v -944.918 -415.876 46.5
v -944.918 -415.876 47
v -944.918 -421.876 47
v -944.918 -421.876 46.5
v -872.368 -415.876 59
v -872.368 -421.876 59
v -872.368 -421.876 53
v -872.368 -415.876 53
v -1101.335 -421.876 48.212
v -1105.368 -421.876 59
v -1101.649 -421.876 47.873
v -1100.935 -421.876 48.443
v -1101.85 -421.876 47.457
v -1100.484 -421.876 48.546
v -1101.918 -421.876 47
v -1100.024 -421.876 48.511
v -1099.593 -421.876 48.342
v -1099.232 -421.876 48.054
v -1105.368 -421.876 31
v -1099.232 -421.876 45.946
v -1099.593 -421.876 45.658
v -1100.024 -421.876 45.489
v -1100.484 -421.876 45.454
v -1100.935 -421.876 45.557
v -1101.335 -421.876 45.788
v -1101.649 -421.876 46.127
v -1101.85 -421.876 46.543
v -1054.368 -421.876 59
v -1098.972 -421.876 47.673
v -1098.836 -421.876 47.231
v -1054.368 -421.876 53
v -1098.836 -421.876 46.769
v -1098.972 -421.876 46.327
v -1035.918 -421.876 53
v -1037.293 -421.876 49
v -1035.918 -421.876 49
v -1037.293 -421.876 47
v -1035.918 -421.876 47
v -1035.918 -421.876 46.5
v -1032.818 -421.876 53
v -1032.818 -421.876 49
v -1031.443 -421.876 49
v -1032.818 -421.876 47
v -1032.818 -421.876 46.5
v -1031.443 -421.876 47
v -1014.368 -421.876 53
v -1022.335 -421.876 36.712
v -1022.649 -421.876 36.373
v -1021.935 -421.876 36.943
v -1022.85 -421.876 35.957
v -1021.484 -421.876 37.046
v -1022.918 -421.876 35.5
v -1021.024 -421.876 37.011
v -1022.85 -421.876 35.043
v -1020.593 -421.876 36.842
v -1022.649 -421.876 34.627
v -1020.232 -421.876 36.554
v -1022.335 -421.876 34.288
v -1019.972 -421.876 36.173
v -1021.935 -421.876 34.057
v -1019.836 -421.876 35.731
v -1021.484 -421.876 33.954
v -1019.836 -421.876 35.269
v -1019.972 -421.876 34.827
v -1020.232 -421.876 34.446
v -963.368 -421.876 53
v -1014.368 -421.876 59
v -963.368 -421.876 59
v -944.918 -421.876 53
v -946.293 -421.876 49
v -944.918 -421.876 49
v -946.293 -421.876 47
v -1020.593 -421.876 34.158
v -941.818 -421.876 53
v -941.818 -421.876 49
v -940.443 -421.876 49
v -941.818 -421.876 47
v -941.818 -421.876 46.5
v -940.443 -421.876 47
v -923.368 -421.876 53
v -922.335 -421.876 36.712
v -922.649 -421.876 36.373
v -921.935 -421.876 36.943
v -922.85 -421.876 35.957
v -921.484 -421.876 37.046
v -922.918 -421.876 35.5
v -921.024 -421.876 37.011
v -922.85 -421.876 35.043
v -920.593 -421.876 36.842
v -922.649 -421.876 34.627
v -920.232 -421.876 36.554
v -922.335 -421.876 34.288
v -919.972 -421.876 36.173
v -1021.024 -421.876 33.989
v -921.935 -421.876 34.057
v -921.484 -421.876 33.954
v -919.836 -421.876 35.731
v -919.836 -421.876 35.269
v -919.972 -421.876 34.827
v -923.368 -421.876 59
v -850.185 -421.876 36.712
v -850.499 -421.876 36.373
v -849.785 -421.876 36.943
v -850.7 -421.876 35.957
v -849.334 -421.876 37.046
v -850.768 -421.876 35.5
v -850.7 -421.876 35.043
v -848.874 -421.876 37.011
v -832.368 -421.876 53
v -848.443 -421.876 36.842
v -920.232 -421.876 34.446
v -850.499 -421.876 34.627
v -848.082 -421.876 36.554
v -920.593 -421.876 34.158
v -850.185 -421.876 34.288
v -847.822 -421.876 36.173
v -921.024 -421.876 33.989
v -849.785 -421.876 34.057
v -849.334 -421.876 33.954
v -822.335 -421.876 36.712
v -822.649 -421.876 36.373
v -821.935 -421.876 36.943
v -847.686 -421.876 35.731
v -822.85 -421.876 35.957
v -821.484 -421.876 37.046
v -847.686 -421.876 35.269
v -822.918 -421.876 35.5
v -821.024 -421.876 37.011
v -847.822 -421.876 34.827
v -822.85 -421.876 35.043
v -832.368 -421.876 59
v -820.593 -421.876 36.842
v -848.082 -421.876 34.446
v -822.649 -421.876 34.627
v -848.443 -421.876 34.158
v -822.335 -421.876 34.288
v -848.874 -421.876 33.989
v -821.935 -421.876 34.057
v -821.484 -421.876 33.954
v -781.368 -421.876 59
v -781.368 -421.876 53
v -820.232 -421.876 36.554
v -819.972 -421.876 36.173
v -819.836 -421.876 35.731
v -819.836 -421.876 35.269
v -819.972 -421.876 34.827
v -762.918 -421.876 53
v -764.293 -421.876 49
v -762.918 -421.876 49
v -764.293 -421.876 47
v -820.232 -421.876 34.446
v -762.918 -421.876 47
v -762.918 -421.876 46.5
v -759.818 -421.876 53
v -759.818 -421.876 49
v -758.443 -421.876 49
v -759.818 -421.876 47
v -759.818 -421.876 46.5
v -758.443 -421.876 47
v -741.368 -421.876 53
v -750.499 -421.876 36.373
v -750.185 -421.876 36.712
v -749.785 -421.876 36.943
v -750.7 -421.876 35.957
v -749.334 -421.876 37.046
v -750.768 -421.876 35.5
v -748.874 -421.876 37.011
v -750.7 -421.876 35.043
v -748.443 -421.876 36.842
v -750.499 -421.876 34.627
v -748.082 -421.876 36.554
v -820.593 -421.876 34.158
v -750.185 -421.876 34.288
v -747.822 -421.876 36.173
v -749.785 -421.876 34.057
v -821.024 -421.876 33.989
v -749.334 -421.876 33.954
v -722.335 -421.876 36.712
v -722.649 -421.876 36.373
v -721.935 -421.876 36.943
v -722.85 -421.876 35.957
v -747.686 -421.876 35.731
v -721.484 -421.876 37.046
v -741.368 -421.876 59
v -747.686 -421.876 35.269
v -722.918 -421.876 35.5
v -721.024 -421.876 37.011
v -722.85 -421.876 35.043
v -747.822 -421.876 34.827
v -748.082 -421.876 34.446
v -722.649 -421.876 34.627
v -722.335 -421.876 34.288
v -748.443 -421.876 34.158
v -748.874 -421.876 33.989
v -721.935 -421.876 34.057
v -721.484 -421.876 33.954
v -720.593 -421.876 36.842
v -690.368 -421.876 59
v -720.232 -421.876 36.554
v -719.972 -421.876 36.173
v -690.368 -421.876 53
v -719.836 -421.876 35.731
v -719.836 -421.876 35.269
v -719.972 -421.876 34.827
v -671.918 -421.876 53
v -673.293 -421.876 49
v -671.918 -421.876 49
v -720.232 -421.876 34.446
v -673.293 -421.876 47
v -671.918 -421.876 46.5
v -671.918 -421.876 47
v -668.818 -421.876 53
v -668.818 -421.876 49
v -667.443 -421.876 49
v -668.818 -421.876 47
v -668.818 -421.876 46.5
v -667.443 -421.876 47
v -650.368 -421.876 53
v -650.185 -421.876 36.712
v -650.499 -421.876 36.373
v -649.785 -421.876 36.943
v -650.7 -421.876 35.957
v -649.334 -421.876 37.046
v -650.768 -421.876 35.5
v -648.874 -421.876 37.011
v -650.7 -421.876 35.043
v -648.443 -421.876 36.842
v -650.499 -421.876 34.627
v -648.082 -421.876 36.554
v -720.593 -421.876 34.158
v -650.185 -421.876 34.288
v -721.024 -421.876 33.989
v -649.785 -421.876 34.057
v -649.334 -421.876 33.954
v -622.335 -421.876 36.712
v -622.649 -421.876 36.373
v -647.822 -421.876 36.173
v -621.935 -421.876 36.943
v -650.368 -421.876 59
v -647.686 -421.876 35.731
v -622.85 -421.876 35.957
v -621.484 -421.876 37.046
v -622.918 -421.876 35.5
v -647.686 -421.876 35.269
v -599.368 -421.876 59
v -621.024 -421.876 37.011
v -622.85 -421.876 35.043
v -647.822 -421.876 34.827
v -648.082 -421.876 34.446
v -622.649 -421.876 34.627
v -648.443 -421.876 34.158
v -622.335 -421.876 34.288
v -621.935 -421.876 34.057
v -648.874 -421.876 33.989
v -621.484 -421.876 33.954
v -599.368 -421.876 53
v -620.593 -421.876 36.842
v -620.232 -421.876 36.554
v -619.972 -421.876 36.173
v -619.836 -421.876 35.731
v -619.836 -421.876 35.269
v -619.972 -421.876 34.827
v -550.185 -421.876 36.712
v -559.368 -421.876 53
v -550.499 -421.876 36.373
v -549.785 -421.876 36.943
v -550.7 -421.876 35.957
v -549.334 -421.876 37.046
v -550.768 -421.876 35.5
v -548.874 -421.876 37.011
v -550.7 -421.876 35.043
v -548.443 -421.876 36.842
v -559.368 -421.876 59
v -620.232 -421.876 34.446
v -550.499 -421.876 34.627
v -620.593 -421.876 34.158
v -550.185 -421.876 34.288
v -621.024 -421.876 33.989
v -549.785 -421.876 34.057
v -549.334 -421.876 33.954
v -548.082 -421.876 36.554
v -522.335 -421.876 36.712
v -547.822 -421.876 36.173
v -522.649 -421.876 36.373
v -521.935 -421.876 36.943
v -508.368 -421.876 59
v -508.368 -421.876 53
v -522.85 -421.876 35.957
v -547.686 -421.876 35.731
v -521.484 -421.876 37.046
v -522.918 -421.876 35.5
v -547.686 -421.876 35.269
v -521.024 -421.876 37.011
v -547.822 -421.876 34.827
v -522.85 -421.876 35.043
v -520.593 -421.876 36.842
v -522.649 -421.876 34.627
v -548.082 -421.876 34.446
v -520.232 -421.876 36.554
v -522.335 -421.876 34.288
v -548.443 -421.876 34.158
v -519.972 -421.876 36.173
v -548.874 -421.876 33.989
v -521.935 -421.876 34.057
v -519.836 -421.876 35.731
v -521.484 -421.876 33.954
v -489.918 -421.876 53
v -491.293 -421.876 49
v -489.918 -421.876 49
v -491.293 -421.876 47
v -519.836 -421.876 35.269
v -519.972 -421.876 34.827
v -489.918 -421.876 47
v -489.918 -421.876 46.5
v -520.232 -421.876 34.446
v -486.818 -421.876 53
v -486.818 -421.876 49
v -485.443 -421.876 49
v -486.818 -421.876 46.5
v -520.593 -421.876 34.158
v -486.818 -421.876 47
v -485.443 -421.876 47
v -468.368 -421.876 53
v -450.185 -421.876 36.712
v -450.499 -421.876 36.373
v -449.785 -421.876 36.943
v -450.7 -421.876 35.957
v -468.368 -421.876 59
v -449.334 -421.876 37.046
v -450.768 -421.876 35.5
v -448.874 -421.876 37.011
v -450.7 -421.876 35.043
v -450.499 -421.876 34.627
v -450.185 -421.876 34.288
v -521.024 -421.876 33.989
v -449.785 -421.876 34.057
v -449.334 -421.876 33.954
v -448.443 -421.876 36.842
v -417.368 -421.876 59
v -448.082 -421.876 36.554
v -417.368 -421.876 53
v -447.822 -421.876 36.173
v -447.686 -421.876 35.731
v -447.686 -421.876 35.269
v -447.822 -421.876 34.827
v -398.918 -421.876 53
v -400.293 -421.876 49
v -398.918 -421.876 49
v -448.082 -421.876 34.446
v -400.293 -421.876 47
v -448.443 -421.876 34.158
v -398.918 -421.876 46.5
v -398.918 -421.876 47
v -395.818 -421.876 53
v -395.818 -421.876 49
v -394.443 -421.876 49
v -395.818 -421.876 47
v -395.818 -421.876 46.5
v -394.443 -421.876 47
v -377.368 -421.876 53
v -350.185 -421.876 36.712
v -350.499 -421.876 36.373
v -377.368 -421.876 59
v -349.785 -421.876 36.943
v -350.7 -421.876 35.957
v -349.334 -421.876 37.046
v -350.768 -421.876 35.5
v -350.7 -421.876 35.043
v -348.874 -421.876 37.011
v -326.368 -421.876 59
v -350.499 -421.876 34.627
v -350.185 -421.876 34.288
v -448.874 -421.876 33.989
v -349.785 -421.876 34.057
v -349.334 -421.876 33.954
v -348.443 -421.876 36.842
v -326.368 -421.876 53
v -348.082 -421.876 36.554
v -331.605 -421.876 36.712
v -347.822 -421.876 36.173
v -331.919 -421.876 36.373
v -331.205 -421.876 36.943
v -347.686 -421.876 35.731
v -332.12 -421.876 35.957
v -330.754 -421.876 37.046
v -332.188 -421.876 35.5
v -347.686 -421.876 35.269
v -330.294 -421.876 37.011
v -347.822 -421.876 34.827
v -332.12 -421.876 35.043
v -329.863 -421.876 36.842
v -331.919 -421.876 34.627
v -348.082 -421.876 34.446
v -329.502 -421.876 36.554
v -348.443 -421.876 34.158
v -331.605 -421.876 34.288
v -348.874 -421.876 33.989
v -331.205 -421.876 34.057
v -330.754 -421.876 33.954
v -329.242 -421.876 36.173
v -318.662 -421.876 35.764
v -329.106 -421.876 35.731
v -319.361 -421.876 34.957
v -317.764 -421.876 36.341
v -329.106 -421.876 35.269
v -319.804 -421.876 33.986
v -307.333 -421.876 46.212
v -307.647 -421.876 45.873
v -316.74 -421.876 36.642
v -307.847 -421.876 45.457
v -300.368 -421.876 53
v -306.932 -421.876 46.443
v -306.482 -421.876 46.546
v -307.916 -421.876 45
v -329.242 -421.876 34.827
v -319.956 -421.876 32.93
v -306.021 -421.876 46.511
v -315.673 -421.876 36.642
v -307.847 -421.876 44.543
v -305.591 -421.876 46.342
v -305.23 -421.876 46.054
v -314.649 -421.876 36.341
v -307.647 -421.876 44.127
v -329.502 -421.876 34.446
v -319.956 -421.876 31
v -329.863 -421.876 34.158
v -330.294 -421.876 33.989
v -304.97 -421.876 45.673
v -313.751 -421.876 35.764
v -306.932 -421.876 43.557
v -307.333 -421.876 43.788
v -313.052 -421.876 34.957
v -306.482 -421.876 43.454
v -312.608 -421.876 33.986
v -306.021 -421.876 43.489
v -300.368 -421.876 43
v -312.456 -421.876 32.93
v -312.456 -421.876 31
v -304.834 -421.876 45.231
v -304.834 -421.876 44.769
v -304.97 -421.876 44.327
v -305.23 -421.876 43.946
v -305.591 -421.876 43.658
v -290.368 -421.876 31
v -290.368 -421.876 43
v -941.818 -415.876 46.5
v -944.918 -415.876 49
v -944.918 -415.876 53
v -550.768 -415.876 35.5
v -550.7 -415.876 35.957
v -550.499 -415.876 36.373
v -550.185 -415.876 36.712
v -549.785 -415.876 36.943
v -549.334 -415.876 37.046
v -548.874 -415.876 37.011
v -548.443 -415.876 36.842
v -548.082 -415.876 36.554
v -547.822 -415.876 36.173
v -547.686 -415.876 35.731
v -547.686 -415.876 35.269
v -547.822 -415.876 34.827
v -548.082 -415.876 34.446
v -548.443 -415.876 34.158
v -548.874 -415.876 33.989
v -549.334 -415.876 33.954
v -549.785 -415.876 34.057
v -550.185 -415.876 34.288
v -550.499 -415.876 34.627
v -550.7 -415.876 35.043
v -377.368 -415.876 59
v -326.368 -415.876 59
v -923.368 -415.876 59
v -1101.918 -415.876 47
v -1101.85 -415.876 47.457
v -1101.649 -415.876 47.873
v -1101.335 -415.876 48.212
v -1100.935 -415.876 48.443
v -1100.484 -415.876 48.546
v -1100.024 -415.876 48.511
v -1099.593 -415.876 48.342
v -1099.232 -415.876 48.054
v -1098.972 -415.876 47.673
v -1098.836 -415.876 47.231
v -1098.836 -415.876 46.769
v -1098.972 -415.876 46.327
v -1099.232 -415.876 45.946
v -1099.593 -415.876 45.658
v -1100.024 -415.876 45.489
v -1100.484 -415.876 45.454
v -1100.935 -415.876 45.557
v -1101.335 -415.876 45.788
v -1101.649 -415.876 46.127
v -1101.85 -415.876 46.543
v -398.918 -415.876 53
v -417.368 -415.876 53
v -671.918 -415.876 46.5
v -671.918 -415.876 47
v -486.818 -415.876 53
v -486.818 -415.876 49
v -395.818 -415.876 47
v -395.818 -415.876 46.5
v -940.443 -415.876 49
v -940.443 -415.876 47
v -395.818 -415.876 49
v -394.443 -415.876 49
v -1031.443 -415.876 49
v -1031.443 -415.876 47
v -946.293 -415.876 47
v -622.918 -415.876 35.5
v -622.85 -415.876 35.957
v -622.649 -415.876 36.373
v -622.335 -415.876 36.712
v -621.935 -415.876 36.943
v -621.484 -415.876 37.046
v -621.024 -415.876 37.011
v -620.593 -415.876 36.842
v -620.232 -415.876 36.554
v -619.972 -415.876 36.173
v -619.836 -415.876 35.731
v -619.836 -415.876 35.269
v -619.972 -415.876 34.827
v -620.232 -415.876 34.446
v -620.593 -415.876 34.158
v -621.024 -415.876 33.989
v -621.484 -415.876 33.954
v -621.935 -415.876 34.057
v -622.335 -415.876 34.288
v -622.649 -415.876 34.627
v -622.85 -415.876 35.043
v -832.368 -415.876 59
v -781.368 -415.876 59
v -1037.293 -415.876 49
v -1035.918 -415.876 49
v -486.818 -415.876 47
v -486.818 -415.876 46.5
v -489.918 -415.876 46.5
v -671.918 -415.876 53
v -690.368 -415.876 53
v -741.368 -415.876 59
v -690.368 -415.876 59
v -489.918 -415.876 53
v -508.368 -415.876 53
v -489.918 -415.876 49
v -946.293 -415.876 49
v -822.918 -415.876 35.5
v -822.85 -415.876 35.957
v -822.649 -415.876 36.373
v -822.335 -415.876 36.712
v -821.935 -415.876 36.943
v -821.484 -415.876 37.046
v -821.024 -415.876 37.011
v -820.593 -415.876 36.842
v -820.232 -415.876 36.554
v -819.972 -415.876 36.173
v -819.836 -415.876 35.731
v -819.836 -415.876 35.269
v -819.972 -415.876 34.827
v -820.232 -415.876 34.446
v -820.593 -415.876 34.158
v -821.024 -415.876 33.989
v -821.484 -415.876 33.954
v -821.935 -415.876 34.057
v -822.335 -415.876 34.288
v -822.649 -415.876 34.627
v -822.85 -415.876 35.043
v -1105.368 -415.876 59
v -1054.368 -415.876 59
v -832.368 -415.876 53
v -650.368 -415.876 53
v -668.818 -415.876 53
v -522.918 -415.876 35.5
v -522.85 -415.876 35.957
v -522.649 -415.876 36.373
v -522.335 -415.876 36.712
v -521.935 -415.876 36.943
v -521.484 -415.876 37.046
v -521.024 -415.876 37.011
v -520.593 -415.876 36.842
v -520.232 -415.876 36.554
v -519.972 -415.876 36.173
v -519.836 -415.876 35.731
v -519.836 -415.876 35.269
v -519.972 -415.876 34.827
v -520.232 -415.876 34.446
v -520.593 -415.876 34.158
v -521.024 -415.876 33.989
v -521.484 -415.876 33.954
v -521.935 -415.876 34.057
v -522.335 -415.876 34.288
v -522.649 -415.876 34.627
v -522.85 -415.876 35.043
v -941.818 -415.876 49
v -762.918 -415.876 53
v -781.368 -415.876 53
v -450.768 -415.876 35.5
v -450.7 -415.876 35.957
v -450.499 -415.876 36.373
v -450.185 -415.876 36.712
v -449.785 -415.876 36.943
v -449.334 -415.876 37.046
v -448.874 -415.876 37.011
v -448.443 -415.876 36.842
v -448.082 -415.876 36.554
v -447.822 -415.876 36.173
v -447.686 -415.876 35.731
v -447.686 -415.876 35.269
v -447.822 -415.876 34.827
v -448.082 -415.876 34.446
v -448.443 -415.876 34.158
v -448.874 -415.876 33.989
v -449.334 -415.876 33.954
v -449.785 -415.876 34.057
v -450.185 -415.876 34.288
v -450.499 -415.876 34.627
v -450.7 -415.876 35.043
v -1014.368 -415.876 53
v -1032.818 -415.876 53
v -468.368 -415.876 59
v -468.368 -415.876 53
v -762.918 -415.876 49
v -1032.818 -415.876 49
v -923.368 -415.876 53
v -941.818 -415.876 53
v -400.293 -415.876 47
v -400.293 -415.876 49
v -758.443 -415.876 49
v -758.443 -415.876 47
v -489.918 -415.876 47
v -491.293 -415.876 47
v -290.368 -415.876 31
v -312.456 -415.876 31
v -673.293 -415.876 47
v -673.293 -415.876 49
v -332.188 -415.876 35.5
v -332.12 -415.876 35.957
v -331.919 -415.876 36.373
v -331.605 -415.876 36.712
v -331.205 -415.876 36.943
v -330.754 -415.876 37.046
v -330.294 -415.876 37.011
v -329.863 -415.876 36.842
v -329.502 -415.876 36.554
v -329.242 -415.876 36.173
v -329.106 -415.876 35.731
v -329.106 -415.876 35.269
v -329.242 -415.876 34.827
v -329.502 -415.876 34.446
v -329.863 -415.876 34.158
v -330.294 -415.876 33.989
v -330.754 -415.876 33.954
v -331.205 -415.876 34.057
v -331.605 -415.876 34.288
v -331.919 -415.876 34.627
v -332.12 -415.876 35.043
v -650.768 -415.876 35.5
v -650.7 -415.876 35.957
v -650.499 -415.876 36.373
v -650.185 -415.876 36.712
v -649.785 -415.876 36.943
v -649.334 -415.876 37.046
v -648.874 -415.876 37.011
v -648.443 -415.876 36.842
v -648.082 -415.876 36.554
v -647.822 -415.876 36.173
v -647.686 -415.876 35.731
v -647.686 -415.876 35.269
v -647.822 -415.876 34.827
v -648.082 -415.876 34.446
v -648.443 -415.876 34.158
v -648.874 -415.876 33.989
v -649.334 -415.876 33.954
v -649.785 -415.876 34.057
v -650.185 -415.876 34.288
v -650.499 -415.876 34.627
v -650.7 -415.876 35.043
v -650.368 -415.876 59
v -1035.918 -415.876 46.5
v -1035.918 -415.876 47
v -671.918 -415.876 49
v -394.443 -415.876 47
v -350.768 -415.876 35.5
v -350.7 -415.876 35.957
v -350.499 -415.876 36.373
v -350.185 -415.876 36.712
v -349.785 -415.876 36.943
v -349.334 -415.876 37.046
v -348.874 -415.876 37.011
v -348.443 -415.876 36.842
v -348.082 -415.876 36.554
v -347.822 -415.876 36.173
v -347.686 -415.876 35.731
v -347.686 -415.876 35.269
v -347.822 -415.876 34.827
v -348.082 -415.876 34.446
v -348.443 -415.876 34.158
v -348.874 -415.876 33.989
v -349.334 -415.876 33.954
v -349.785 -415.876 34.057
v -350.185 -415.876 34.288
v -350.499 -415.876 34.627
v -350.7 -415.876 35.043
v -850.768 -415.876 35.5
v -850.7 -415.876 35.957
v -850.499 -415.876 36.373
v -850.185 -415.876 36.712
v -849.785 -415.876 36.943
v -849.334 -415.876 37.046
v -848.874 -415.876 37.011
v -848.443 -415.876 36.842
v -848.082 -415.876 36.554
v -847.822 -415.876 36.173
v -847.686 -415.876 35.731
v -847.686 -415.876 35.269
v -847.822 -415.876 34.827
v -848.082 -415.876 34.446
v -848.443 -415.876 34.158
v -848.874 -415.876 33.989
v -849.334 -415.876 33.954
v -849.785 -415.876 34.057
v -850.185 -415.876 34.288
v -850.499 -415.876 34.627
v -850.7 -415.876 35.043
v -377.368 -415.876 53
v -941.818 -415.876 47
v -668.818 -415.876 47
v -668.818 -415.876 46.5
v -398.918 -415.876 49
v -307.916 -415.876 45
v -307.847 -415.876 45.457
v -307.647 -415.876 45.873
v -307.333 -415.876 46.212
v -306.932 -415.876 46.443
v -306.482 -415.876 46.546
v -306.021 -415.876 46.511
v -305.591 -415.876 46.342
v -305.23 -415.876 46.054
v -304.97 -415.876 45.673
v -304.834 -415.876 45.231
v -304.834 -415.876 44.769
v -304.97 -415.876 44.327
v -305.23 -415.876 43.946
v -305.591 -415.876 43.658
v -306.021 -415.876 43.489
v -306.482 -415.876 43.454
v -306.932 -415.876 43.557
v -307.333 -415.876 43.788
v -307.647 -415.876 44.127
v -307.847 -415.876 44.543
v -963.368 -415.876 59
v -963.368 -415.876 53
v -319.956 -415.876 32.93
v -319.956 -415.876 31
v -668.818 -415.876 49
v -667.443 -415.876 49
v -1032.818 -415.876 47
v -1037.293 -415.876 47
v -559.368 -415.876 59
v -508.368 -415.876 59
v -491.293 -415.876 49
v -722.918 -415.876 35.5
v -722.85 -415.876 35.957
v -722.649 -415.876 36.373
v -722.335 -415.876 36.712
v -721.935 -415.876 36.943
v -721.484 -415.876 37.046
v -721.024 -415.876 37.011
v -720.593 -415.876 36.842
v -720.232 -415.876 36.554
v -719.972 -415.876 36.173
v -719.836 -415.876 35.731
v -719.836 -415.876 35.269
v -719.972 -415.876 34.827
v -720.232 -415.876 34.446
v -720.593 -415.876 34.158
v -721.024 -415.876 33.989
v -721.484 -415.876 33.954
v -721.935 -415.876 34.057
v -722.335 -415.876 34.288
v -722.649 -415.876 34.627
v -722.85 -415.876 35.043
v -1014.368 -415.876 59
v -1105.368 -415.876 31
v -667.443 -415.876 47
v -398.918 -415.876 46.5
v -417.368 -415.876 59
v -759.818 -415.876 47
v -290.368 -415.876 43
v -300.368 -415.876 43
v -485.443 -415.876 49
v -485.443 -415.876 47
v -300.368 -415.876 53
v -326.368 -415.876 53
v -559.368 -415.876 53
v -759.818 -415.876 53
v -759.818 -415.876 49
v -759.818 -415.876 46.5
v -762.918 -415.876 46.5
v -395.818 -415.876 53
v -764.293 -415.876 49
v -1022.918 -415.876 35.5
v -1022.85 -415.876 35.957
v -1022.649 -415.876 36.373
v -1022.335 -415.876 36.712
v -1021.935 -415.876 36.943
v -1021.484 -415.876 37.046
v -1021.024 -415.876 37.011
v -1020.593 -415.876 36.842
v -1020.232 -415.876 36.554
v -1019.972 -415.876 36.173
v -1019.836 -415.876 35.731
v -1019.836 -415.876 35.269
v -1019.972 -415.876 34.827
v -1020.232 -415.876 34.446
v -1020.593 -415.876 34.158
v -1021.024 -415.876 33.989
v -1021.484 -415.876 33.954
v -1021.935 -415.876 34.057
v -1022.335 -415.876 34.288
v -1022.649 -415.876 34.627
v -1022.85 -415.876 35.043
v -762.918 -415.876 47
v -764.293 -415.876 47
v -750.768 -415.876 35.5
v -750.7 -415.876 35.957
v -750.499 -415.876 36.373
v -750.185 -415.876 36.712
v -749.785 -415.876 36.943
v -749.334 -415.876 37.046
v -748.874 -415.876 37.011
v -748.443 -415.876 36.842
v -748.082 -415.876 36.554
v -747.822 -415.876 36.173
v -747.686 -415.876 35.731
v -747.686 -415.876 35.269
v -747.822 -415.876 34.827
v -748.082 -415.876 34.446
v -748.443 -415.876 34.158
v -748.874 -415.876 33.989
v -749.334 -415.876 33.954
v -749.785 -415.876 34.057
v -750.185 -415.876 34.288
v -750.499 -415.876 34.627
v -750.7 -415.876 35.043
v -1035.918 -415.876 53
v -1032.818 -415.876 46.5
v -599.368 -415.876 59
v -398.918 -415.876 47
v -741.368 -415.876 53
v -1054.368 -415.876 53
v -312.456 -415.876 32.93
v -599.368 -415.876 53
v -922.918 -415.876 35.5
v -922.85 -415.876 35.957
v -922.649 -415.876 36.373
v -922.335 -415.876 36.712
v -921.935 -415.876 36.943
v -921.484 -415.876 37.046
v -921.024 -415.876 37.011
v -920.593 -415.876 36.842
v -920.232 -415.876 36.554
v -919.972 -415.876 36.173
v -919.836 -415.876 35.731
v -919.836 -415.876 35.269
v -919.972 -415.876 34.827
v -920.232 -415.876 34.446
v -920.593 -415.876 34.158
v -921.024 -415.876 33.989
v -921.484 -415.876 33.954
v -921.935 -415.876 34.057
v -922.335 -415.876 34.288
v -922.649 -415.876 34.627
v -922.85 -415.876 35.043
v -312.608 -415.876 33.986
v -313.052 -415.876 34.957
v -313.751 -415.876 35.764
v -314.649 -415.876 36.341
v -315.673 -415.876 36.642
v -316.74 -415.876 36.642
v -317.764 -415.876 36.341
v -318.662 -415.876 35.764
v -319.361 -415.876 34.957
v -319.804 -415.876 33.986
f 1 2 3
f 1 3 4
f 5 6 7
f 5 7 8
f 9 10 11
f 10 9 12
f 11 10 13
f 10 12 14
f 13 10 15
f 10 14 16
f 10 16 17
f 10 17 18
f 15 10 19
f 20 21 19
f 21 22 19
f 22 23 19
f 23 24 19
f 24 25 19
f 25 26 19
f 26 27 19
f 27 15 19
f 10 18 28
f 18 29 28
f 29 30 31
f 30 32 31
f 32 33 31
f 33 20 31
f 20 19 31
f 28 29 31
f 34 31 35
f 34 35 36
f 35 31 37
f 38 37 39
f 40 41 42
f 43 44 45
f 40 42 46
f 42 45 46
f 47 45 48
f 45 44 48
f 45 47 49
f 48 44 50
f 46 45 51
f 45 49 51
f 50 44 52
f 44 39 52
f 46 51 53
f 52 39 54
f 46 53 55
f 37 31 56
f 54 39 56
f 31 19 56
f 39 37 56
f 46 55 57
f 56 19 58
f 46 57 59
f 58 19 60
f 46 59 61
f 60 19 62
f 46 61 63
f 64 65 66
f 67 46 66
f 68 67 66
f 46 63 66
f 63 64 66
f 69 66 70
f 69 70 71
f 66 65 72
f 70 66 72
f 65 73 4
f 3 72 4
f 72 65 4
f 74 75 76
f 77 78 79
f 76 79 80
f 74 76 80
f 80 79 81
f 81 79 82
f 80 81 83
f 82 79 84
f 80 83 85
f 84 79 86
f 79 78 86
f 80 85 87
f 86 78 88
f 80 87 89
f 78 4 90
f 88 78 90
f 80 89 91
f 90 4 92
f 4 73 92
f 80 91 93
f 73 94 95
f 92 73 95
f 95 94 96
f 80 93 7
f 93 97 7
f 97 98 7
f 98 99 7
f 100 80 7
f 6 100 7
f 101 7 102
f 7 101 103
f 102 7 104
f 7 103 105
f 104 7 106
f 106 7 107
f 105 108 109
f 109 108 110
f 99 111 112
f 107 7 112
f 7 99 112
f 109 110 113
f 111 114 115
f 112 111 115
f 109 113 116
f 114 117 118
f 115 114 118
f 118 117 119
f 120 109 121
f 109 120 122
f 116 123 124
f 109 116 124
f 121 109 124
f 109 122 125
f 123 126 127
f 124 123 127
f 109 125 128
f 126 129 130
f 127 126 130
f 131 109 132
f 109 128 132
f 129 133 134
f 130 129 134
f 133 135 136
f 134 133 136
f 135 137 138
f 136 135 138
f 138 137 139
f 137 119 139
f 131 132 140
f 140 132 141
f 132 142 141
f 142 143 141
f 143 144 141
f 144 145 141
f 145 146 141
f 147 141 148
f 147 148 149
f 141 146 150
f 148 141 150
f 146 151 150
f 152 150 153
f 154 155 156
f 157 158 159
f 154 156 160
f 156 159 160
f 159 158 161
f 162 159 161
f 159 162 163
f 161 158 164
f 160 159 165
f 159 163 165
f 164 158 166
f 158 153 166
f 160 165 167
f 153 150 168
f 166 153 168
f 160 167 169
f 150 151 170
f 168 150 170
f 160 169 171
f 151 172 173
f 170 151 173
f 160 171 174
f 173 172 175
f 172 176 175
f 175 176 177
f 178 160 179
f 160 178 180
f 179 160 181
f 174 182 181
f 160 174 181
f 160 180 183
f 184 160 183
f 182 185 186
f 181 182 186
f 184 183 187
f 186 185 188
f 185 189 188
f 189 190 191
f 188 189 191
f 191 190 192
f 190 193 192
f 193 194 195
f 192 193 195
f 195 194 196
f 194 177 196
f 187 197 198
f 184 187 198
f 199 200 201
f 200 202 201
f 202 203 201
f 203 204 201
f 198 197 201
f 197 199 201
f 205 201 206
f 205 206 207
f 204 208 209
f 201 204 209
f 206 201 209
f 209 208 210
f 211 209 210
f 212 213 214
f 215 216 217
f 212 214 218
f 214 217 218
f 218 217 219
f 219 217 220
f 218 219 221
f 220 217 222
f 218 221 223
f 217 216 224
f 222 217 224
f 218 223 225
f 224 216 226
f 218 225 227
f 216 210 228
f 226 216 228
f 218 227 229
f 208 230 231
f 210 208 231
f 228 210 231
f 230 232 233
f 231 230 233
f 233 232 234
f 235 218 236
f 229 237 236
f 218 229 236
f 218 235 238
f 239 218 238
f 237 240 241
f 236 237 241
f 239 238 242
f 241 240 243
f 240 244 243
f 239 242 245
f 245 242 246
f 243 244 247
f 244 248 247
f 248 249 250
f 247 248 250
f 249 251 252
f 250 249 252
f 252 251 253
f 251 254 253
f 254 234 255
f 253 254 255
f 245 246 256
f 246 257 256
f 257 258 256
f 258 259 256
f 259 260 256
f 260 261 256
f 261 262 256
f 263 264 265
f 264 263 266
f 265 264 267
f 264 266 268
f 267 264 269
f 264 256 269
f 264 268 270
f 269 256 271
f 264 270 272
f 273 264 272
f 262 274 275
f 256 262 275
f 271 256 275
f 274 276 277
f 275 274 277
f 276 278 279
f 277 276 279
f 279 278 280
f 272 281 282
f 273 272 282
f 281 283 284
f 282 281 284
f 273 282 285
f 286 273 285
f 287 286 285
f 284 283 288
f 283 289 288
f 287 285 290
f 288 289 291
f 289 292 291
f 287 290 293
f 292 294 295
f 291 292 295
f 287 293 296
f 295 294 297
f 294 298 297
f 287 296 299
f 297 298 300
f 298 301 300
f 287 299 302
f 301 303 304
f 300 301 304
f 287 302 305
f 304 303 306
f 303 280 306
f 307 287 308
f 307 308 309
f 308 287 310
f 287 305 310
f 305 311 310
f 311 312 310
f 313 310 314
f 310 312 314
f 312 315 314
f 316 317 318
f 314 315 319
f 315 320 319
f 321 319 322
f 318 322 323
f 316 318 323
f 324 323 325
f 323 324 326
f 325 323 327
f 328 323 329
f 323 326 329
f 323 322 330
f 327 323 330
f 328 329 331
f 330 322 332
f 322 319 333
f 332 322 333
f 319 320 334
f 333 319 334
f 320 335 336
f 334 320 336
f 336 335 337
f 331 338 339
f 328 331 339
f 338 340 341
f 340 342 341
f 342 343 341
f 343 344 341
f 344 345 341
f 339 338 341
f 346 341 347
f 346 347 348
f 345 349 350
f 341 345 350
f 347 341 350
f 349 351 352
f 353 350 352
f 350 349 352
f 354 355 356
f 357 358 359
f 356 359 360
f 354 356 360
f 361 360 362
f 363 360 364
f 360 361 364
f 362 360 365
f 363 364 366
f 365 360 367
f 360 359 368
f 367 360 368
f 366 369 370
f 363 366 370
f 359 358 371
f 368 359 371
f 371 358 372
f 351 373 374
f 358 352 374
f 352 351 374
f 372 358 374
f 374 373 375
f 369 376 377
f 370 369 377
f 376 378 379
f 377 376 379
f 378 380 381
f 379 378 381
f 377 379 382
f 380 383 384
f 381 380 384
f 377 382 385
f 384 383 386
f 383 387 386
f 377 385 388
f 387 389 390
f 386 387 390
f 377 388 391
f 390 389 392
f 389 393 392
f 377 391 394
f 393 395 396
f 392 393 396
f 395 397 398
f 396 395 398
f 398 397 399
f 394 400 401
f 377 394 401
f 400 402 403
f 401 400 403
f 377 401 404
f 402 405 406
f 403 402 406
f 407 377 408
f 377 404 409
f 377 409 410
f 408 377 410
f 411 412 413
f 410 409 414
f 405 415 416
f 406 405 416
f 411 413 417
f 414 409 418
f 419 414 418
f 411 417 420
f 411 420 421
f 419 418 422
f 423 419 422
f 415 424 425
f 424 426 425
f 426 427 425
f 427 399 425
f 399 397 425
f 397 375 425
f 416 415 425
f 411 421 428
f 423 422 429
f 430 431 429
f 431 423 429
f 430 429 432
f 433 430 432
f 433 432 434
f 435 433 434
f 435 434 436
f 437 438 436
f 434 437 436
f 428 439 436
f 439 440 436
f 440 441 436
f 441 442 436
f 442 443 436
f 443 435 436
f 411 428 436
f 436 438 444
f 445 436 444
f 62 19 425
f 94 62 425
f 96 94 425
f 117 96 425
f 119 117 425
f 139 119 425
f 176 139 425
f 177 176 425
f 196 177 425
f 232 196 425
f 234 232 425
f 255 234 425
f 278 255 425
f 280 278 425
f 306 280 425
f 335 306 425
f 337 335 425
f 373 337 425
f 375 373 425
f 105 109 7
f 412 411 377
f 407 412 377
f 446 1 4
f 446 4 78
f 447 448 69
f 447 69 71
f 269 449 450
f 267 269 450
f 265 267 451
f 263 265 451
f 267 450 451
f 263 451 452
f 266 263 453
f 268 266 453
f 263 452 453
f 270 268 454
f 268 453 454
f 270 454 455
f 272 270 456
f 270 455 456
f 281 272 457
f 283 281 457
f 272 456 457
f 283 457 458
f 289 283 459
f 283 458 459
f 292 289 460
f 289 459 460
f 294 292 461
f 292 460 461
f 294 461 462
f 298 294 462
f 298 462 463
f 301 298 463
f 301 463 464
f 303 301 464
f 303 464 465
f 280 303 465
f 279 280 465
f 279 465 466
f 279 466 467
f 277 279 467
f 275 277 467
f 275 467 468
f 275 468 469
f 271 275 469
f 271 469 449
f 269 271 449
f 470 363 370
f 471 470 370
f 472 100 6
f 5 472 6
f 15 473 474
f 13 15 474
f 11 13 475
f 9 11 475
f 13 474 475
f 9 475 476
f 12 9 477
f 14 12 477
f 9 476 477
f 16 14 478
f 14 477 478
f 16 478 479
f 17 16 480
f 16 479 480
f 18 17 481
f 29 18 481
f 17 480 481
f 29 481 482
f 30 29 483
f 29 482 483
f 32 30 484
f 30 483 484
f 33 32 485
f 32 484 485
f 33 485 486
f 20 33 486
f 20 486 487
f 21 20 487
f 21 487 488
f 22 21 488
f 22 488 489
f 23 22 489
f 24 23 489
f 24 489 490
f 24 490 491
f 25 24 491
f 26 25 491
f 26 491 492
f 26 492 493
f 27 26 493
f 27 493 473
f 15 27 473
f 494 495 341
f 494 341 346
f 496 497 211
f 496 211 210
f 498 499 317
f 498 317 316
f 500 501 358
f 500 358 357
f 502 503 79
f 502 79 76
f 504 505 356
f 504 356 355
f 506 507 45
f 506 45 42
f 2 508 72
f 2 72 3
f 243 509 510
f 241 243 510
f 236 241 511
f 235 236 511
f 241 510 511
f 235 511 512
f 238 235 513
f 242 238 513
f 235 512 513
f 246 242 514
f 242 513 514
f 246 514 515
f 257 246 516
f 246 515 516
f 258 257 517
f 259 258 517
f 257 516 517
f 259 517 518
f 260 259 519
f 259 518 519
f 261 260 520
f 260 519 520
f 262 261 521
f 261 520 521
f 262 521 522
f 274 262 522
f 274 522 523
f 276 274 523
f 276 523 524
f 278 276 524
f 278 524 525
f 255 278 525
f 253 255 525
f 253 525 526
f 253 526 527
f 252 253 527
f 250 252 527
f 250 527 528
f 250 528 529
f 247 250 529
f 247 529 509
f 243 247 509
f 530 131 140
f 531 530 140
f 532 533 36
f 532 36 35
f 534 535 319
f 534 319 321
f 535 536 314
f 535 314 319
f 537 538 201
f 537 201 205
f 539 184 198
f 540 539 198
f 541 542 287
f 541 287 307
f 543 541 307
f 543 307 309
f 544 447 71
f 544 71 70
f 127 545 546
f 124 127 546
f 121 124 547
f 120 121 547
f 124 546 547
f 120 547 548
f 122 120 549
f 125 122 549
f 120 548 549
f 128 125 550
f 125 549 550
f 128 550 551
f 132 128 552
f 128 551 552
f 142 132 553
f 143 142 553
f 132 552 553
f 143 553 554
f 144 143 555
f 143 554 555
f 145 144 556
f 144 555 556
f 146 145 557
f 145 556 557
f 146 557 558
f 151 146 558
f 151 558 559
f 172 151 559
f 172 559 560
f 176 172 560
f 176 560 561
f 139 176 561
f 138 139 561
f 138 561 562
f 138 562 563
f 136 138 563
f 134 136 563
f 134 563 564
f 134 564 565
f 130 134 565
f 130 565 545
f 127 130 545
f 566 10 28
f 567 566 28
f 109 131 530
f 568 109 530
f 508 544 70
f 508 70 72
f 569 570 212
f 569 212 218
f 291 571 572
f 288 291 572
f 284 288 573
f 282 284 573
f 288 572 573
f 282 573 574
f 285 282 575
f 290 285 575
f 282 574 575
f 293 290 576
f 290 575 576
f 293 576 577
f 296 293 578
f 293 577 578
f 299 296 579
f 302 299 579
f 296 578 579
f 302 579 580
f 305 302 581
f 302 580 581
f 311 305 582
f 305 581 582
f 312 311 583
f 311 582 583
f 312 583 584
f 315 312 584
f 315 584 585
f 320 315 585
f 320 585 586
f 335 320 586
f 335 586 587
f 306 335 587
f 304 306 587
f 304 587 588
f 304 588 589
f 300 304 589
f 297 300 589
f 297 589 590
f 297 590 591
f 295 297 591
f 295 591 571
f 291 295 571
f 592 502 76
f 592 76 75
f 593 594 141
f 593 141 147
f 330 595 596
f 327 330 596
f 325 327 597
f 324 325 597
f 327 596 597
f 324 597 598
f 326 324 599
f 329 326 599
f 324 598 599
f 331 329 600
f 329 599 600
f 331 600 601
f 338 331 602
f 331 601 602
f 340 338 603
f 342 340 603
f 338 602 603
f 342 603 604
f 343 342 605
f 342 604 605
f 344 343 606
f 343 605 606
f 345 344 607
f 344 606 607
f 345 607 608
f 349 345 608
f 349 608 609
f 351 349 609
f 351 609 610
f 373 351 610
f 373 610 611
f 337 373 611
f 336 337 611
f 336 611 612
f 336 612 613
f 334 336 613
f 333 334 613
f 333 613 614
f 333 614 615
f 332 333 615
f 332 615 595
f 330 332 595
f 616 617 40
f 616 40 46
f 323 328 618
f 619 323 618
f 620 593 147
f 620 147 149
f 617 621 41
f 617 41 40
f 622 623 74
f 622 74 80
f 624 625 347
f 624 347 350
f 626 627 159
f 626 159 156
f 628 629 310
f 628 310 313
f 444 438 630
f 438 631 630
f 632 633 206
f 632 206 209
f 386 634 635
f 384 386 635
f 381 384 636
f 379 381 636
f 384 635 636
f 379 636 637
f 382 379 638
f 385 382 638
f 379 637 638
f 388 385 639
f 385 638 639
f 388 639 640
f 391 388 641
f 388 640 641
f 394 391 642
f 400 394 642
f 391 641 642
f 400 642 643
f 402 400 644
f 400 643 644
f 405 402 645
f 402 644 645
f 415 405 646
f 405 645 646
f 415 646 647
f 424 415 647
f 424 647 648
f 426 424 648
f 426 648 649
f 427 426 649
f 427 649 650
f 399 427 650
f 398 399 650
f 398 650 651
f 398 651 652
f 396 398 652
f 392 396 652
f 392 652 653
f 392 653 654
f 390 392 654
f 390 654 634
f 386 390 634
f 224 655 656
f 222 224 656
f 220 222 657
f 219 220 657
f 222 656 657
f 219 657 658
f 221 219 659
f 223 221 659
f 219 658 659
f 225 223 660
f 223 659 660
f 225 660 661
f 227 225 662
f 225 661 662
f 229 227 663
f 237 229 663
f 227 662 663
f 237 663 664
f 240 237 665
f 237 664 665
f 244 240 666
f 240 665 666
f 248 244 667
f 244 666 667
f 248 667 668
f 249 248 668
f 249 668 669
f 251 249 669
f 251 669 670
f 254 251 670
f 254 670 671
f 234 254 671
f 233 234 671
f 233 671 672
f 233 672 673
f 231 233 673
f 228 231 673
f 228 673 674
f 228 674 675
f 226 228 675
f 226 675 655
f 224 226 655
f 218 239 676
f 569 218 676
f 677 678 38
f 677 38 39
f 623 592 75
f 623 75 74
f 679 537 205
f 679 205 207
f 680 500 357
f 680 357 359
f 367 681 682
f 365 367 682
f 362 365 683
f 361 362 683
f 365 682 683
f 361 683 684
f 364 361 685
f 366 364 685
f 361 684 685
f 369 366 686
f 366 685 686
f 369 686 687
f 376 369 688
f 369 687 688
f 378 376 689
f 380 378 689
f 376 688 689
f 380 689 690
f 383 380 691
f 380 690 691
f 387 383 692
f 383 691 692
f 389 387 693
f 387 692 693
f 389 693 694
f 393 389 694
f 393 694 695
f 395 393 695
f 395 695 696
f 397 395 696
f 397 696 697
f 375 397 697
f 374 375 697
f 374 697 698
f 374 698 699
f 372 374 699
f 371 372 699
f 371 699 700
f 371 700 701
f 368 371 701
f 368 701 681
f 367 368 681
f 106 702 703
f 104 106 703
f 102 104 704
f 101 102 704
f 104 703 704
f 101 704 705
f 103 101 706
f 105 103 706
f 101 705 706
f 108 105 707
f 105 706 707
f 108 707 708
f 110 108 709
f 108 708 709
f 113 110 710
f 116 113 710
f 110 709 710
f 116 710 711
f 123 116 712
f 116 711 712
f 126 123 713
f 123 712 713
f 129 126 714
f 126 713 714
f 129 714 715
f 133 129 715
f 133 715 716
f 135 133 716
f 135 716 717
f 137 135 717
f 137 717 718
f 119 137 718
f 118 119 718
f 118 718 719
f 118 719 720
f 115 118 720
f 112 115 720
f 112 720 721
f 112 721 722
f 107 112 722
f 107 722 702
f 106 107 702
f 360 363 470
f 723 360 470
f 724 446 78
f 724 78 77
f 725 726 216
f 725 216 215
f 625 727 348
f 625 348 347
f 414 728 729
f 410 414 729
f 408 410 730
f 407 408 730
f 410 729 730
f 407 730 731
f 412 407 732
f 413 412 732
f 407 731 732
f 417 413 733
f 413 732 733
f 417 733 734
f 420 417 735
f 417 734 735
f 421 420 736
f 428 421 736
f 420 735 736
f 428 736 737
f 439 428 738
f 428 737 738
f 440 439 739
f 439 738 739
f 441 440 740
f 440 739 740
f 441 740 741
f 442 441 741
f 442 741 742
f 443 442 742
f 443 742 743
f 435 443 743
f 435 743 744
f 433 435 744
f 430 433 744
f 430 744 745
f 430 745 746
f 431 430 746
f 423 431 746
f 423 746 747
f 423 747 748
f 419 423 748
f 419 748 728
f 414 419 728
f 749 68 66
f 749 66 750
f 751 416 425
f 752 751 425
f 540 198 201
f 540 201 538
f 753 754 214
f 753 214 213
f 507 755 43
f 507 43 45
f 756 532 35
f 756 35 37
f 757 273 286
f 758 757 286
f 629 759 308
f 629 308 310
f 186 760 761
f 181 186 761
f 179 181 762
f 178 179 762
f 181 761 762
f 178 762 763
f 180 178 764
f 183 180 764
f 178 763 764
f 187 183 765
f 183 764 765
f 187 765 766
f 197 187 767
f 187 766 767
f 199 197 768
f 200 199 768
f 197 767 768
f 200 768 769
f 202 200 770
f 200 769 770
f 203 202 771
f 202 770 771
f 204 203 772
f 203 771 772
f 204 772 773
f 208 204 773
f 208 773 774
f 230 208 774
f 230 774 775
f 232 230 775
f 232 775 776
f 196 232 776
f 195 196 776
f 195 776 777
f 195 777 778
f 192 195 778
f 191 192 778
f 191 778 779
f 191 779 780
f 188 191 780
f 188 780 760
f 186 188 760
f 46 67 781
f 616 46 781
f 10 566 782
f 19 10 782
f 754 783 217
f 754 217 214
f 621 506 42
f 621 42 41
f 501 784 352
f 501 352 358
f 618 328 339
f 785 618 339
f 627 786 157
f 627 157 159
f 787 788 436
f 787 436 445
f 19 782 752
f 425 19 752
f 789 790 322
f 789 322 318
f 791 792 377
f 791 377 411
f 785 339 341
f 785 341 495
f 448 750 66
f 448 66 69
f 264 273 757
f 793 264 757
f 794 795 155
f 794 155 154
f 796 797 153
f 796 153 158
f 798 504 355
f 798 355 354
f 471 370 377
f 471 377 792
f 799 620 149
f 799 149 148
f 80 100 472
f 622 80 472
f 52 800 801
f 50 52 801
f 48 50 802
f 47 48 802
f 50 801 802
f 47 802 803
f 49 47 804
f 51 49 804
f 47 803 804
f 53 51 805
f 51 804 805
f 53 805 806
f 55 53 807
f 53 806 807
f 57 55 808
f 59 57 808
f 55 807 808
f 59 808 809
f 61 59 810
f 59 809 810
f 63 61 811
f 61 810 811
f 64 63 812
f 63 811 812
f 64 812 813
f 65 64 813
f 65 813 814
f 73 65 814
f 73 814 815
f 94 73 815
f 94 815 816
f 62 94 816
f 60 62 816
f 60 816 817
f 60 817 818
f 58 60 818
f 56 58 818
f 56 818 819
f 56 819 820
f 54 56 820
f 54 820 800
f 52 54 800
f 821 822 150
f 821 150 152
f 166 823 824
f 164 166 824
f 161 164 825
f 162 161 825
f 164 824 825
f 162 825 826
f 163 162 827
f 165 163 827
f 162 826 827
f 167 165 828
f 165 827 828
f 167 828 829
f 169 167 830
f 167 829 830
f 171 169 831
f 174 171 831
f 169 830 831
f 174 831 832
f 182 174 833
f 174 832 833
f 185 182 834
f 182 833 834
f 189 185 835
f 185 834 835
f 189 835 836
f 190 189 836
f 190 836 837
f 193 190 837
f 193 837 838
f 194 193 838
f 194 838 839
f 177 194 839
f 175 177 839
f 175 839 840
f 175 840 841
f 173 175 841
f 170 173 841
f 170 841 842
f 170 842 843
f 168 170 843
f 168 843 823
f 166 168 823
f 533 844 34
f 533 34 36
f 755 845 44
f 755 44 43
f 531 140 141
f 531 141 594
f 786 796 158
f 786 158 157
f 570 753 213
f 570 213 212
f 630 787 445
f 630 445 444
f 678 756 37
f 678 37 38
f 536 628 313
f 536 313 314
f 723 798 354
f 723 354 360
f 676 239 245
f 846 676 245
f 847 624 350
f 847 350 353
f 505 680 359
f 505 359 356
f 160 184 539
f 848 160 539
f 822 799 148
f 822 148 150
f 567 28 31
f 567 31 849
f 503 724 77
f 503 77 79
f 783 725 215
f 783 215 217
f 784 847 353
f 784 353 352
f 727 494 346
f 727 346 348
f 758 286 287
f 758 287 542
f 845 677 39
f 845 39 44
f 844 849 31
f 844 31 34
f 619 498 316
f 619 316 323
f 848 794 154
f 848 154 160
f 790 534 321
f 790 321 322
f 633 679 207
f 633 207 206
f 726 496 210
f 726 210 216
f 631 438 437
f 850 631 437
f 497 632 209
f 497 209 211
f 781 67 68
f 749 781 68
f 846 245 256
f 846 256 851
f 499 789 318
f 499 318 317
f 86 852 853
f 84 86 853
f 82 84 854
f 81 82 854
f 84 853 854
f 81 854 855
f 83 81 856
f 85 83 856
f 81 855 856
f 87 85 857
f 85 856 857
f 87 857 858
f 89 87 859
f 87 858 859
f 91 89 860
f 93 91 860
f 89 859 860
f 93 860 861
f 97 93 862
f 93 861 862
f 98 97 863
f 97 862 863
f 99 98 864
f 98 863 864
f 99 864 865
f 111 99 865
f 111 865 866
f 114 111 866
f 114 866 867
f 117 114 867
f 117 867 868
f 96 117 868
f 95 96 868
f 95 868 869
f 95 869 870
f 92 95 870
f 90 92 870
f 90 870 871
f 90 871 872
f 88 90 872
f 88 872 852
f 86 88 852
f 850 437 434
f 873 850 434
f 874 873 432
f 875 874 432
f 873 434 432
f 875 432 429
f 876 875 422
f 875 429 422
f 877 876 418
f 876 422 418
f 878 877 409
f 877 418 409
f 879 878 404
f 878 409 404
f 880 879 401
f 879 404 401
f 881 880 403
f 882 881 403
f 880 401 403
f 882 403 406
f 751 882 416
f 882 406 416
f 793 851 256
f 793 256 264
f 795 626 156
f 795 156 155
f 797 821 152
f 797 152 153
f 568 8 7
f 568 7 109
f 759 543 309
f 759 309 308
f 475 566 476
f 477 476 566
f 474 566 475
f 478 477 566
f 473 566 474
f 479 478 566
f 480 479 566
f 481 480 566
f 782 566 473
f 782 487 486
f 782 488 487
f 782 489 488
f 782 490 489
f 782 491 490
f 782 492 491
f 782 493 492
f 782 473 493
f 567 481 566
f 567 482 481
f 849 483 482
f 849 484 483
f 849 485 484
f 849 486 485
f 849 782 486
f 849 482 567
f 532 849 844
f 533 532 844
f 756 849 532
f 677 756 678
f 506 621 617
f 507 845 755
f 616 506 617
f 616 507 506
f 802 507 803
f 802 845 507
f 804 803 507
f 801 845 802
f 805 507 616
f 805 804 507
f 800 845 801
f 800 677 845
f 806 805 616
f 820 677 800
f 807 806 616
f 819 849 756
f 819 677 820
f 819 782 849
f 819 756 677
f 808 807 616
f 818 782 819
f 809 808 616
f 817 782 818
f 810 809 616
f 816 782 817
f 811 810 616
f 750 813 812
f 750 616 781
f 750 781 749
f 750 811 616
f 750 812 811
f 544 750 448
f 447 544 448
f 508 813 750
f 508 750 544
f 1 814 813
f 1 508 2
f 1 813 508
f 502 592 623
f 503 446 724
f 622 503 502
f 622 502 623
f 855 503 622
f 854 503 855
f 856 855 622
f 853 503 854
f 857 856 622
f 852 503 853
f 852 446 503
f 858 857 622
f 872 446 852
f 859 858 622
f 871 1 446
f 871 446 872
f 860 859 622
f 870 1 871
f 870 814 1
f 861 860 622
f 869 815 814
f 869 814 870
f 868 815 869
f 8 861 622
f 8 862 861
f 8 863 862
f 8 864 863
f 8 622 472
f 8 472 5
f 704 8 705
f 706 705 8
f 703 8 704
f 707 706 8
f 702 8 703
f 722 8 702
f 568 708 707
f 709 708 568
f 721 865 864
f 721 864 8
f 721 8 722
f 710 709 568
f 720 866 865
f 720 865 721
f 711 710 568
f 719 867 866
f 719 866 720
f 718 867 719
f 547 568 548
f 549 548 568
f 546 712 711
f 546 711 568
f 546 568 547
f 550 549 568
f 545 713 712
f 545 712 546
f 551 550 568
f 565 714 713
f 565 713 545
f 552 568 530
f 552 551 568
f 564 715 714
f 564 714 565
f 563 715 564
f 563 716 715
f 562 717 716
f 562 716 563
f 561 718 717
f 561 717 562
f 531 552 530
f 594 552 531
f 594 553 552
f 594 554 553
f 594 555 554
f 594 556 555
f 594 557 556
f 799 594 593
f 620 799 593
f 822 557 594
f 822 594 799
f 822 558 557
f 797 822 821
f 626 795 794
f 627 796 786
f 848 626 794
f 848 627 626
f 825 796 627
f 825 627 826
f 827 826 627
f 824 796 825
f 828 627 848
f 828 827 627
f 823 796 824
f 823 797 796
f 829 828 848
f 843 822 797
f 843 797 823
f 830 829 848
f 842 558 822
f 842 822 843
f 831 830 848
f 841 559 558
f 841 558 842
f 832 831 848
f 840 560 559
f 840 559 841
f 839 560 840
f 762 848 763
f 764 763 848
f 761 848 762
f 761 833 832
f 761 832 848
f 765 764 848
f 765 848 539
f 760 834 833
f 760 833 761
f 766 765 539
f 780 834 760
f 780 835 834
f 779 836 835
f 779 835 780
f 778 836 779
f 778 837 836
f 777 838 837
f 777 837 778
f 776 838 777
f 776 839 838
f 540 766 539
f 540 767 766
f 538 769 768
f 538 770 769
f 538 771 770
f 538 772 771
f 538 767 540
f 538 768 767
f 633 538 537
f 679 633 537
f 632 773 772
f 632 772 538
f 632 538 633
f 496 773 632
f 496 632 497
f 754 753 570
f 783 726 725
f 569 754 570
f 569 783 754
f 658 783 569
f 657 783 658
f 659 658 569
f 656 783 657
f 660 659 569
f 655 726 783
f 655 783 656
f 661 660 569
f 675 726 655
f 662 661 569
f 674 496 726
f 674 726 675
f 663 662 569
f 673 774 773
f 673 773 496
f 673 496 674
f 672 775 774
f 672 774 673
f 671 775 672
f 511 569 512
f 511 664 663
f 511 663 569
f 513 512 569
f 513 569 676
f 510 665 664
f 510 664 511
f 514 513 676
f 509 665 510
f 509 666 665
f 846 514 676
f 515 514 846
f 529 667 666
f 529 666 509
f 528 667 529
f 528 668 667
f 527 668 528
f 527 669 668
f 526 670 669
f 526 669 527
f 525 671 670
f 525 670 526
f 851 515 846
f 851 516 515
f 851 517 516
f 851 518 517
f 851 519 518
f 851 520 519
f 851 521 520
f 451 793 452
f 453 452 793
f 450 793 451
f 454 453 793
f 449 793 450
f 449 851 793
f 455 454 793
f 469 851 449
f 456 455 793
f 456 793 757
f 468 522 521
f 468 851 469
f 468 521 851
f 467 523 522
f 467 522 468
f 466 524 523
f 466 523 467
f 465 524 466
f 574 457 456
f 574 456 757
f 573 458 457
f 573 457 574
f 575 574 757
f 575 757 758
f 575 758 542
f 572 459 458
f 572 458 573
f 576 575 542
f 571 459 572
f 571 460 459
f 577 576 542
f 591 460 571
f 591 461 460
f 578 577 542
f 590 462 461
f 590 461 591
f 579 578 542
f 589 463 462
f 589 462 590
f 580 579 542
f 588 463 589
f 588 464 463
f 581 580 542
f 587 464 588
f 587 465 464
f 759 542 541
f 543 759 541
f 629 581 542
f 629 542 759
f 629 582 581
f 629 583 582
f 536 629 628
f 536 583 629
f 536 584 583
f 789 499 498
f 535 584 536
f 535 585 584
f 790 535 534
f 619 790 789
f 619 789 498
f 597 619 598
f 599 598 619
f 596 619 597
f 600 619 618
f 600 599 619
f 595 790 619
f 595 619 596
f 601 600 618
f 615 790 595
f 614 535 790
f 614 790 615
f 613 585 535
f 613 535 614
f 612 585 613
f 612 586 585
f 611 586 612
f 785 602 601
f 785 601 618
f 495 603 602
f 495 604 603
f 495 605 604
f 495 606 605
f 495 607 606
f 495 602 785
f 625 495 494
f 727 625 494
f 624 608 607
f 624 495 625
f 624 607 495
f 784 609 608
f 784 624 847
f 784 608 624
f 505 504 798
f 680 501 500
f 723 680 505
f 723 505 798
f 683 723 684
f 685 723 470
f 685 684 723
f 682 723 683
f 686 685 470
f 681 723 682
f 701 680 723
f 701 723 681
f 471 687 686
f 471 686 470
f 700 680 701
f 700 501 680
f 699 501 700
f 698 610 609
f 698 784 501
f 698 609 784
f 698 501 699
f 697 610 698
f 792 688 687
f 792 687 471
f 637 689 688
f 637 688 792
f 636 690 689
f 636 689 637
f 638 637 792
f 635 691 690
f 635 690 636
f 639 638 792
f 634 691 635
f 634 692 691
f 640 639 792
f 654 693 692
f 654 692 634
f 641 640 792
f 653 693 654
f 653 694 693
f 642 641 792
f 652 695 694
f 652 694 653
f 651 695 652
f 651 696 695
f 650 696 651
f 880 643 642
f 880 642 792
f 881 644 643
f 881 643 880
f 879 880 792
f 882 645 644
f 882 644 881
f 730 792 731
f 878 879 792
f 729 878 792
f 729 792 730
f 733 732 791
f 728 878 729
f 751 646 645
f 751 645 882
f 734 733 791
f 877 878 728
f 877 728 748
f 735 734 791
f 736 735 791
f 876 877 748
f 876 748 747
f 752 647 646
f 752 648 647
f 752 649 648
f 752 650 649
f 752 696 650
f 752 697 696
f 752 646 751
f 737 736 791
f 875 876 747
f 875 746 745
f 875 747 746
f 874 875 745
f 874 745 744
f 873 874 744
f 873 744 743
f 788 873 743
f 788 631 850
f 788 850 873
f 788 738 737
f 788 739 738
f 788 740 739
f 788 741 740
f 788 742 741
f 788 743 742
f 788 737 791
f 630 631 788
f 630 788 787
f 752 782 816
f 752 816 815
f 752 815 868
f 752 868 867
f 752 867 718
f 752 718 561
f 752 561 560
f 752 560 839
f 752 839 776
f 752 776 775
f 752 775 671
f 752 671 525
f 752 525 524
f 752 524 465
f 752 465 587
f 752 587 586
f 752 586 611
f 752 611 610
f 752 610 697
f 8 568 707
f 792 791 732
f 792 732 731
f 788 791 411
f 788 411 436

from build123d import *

# Parameters (mm, degrees)
DODANIE_WYCI_GNI_CIE2_DEPTH      = 3
DODANIE_WYCI_GNI_CIE2_DEPTH_BACK = 3
SZKIC1_W                         = 880
SZKIC1_H                         = 69
SZKIC1_W_2                       = 735
SZKIC1_H_2                       = 28
SZKIC2_W                         = 40
SZKIC2_H                         = 6
WYTNIJ_WYCI_GNI_CIE1_DEPTH       = 6
SZYK_LINIOWY1_COUNT              = 13
SZYK_LINIOWY1_PITCH              = 91
WYTNIJ_WYCI_GNI_CIE2_DEPTH       = 6
SZKIC9_R                         = 12.5
WYTNIJ_WYCI_GNI_CIE6_DEPTH       = 6
WYTNIJ_WYCI_GNI_CIE7_DEPTH       = 6
SZKIC13_W                        = 25
SZKIC13_H                        = 15
WYTNIJ_WYCI_GNI_CIE8_DEPTH       = 6
SZYK_LINIOWY3_COUNT              = 2
SZYK_LINIOWY3_PITCH              = 91
SZYK_LINIOWY3_COUNT_DIR2         = 3
SZYK_LINIOWY3_PITCH_DIR2         = 273
SZKIC14_OUTSIDE_W                = 1058.544
SZKIC14_OUTSIDE_H                = 247.544
SZKIC14_OUTSIDE_W_2              = 815
SZKIC14_OUTSIDE_H_2              = 28
WYTNIJ_WYCI_GNI_CIE9_DEPTH       = 10
SZKIC15_R                        = 1.55
WYTNIJ_WYCI_GNI_CIE10_DEPTH      = 10
SZKIC18_R                        = 1.55
WYTNIJ_WYCI_GNI_CIE11_DEPTH      = 10
SZKIC19_R                        = 1.55
WYTNIJ_WYCI_GNI_CIE12_DEPTH      = 10
SZYK_LINIOWY4_COUNT              = 6
SZYK_LINIOWY4_PITCH              = 100
SZKIC20_W                        = 10
SZKIC20_H                        = 10
WYTNIJ_WYCI_GNI_CIE13_DEPTH      = 10


with BuildPart() as part:
    # Szkic1 → Dodanie-wyciągnięcie2 (new, two sides: drawn at the far end of the back side and taken through both)
    with BuildSketch(Plane(origin=(0, -418.87633849, -418.87633849), x_dir=(1, 0, 0), z_dir=(0, 1, 0)).offset(-DODANIE_WYCI_GNI_CIE2_DEPTH_BACK)):
        with Locations((-705.368459045, -443.37633849)):
            Rectangle(SZKIC1_W, SZKIC1_H)
        with Locations((-703.368459045, -435.87633849)):
            Rectangle(SZKIC1_W_2, SZKIC1_H_2, mode=Mode.SUBTRACT)
    extrude(amount=DODANIE_WYCI_GNI_CIE2_DEPTH + DODANIE_WYCI_GNI_CIE2_DEPTH_BACK)

    # Szkic2 → Wytnij-wyciągnięcie1 (cut)
    with BuildSketch(Plane.XY.offset(59)):
        with Locations((-1125.368459045, -418.87633849)):
            Rectangle(SZKIC2_W, SZKIC2_H)
    wytnij_wyci_gni_cie1 = extrude(amount=-WYTNIJ_WYCI_GNI_CIE1_DEPTH, mode=Mode.SUBTRACT)

    # Szyk liniowy1: Wytnij-wyciągnięcie1 ×13
    with Locations(*[(i * SZYK_LINIOWY1_PITCH, 0, 0) for i in range(1, SZYK_LINIOWY1_COUNT)]):
        add(wytnij_wyci_gni_cie1, mode=Mode.SUBTRACT)

    # Szkic3 → Wytnij-wyciągnięcie2 (cut)
    with BuildSketch(Plane(origin=(0, -415.87633849, 0), x_dir=(1, 0, 0), z_dir=(0, 1, 0))):
        Polygon((-1032.818459045, -53), (-1035.918459045, -53), (-1035.918459045, -49), (-1037.293459045, -49), (-1037.293459045, -47), (-1035.918459045, -47), (-1035.918459045, -46.5), (-1032.818459045, -46.5), (-1032.818459045, -47), (-1031.443459045, -47), (-1031.443459045, -49), (-1032.818459045, -49), align=None)
    wytnij_wyci_gni_cie2 = extrude(amount=-WYTNIJ_WYCI_GNI_CIE2_DEPTH, mode=Mode.SUBTRACT)

    # Szkic9 → Wytnij-wyciągnięcie6 (cut)
    with BuildSketch(Plane(origin=(0, -415.87633849, 0), x_dir=(1, 0, 0), z_dir=(0, 1, 0))):
        with Locations((-300.706340265, -17.43)):
            Circle(SZKIC9_R)
    extrude(amount=-WYTNIJ_WYCI_GNI_CIE6_DEPTH, mode=Mode.SUBTRACT)

    # Szkic11 → Wytnij-wyciągnięcie7 (cut)
    with BuildSketch(Plane.XZ.offset(421.87633849)):
        with BuildLine():
            Line((-319.956340265, 32.93), (-319.956340265, 30.976099153))
            Line((-319.956340265, 30.976099153), (-312.456340265, 30.976099153))
            Line((-312.456340265, 30.976099153), (-312.456340265, 32.93))
            ThreePointArc((-312.456340265, 32.93), (-316.206340265, 36.68), (-319.956340265, 32.93))
        make_face()
    extrude(amount=-WYTNIJ_WYCI_GNI_CIE7_DEPTH, mode=Mode.SUBTRACT)

    # Szkic13 → Wytnij-wyciągnięcie8 (cut)
    with BuildSketch(Plane(origin=(0, -415.87633849, 0), x_dir=(1, 0, 0), z_dir=(0, 1, 0))):
        with Locations((-277.868459045, -51.5)):
            Rectangle(SZKIC13_W, SZKIC13_H)
    extrude(amount=-WYTNIJ_WYCI_GNI_CIE8_DEPTH, mode=Mode.SUBTRACT)

    # Szyk liniowy3: Wytnij-wyci_gni_cie2 2 × 3
    with Locations(*[Vector(1, 0, 0) * (i * SZYK_LINIOWY3_PITCH) + Vector(1, 0, 0) * (j * SZYK_LINIOWY3_PITCH_DIR2) for i in range(SZYK_LINIOWY3_COUNT) for j in range(SZYK_LINIOWY3_COUNT_DIR2) if (i, j) != (0, 0)]):
        add(wytnij_wyci_gni_cie2, mode=Mode.SUBTRACT)

    # Szkic14 outside → Wytnij-wyciągnięcie9 (cut)
    with BuildSketch(Plane(origin=(0, -415.87633849, 0), x_dir=(1, 0, 0), z_dir=(0, 1, 0))):
        with Locations((-705.368, -24.5)):
            Rectangle(SZKIC14_OUTSIDE_W, SZKIC14_OUTSIDE_H)
        with Locations((-697.868459045, -45)):
            Rectangle(SZKIC14_OUTSIDE_W_2, SZKIC14_OUTSIDE_H_2, mode=Mode.SUBTRACT)
    extrude(amount=-WYTNIJ_WYCI_GNI_CIE9_DEPTH, mode=Mode.SUBTRACT)

    # Szkic15 → Wytnij-wyciągnięcie10 (cut)
    with BuildSketch(Plane(origin=(0, -415.87633849, 0), x_dir=(1, 0, 0), z_dir=(0, 1, 0))):
        with Locations((-1100.368459045, -47)):
            Circle(SZKIC15_R)
        with Locations((-306.36620557, -45)):
            Circle(SZKIC15_R)
    extrude(amount=-WYTNIJ_WYCI_GNI_CIE10_DEPTH, mode=Mode.SUBTRACT)

    # Szkic18 → Wytnij-wyciągnięcie11 (cut)
    with BuildSketch(Plane(origin=(0, -415.87633849, 0), x_dir=(1, 0, 0), z_dir=(0, 1, 0))):
        with Locations((-330.638459045, -35.5)):
            Circle(SZKIC18_R)
    extrude(amount=-WYTNIJ_WYCI_GNI_CIE11_DEPTH, mode=Mode.SUBTRACT)

    # Szkic19 → Wytnij-wyciągnięcie12 (cut)
    with BuildSketch(Plane(origin=(0, -415.87633849, 0), x_dir=(1, 0, 0), z_dir=(0, 1, 0))):
        with Locations((-1021.368458991, -35.5)):
            Circle(SZKIC19_R)
        with Locations((-849.218458991, -35.5)):
            Circle(SZKIC19_R)
    wytnij_wyci_gni_cie12 = extrude(amount=-WYTNIJ_WYCI_GNI_CIE12_DEPTH, mode=Mode.SUBTRACT)

    # Szyk liniowy4: Wytnij-wyciągnięcie12 ×6
    with Locations(*[(i * SZYK_LINIOWY4_PITCH, 0, 0) for i in range(1, SZYK_LINIOWY4_COUNT)]):
        add(wytnij_wyci_gni_cie12, mode=Mode.SUBTRACT)

    # Szkic20 → Wytnij-wyciągnięcie13 (cut)
    with BuildSketch(Plane(origin=(0, -415.87633849, 0), x_dir=(1, 0, 0), z_dir=(0, 1, 0))):
        with Locations((-295.368459045, -48)):
            Rectangle(SZKIC20_W, SZKIC20_H)
    extrude(amount=-WYTNIJ_WYCI_GNI_CIE13_DEPTH, mode=Mode.SUBTRACT)


solid = part.part
